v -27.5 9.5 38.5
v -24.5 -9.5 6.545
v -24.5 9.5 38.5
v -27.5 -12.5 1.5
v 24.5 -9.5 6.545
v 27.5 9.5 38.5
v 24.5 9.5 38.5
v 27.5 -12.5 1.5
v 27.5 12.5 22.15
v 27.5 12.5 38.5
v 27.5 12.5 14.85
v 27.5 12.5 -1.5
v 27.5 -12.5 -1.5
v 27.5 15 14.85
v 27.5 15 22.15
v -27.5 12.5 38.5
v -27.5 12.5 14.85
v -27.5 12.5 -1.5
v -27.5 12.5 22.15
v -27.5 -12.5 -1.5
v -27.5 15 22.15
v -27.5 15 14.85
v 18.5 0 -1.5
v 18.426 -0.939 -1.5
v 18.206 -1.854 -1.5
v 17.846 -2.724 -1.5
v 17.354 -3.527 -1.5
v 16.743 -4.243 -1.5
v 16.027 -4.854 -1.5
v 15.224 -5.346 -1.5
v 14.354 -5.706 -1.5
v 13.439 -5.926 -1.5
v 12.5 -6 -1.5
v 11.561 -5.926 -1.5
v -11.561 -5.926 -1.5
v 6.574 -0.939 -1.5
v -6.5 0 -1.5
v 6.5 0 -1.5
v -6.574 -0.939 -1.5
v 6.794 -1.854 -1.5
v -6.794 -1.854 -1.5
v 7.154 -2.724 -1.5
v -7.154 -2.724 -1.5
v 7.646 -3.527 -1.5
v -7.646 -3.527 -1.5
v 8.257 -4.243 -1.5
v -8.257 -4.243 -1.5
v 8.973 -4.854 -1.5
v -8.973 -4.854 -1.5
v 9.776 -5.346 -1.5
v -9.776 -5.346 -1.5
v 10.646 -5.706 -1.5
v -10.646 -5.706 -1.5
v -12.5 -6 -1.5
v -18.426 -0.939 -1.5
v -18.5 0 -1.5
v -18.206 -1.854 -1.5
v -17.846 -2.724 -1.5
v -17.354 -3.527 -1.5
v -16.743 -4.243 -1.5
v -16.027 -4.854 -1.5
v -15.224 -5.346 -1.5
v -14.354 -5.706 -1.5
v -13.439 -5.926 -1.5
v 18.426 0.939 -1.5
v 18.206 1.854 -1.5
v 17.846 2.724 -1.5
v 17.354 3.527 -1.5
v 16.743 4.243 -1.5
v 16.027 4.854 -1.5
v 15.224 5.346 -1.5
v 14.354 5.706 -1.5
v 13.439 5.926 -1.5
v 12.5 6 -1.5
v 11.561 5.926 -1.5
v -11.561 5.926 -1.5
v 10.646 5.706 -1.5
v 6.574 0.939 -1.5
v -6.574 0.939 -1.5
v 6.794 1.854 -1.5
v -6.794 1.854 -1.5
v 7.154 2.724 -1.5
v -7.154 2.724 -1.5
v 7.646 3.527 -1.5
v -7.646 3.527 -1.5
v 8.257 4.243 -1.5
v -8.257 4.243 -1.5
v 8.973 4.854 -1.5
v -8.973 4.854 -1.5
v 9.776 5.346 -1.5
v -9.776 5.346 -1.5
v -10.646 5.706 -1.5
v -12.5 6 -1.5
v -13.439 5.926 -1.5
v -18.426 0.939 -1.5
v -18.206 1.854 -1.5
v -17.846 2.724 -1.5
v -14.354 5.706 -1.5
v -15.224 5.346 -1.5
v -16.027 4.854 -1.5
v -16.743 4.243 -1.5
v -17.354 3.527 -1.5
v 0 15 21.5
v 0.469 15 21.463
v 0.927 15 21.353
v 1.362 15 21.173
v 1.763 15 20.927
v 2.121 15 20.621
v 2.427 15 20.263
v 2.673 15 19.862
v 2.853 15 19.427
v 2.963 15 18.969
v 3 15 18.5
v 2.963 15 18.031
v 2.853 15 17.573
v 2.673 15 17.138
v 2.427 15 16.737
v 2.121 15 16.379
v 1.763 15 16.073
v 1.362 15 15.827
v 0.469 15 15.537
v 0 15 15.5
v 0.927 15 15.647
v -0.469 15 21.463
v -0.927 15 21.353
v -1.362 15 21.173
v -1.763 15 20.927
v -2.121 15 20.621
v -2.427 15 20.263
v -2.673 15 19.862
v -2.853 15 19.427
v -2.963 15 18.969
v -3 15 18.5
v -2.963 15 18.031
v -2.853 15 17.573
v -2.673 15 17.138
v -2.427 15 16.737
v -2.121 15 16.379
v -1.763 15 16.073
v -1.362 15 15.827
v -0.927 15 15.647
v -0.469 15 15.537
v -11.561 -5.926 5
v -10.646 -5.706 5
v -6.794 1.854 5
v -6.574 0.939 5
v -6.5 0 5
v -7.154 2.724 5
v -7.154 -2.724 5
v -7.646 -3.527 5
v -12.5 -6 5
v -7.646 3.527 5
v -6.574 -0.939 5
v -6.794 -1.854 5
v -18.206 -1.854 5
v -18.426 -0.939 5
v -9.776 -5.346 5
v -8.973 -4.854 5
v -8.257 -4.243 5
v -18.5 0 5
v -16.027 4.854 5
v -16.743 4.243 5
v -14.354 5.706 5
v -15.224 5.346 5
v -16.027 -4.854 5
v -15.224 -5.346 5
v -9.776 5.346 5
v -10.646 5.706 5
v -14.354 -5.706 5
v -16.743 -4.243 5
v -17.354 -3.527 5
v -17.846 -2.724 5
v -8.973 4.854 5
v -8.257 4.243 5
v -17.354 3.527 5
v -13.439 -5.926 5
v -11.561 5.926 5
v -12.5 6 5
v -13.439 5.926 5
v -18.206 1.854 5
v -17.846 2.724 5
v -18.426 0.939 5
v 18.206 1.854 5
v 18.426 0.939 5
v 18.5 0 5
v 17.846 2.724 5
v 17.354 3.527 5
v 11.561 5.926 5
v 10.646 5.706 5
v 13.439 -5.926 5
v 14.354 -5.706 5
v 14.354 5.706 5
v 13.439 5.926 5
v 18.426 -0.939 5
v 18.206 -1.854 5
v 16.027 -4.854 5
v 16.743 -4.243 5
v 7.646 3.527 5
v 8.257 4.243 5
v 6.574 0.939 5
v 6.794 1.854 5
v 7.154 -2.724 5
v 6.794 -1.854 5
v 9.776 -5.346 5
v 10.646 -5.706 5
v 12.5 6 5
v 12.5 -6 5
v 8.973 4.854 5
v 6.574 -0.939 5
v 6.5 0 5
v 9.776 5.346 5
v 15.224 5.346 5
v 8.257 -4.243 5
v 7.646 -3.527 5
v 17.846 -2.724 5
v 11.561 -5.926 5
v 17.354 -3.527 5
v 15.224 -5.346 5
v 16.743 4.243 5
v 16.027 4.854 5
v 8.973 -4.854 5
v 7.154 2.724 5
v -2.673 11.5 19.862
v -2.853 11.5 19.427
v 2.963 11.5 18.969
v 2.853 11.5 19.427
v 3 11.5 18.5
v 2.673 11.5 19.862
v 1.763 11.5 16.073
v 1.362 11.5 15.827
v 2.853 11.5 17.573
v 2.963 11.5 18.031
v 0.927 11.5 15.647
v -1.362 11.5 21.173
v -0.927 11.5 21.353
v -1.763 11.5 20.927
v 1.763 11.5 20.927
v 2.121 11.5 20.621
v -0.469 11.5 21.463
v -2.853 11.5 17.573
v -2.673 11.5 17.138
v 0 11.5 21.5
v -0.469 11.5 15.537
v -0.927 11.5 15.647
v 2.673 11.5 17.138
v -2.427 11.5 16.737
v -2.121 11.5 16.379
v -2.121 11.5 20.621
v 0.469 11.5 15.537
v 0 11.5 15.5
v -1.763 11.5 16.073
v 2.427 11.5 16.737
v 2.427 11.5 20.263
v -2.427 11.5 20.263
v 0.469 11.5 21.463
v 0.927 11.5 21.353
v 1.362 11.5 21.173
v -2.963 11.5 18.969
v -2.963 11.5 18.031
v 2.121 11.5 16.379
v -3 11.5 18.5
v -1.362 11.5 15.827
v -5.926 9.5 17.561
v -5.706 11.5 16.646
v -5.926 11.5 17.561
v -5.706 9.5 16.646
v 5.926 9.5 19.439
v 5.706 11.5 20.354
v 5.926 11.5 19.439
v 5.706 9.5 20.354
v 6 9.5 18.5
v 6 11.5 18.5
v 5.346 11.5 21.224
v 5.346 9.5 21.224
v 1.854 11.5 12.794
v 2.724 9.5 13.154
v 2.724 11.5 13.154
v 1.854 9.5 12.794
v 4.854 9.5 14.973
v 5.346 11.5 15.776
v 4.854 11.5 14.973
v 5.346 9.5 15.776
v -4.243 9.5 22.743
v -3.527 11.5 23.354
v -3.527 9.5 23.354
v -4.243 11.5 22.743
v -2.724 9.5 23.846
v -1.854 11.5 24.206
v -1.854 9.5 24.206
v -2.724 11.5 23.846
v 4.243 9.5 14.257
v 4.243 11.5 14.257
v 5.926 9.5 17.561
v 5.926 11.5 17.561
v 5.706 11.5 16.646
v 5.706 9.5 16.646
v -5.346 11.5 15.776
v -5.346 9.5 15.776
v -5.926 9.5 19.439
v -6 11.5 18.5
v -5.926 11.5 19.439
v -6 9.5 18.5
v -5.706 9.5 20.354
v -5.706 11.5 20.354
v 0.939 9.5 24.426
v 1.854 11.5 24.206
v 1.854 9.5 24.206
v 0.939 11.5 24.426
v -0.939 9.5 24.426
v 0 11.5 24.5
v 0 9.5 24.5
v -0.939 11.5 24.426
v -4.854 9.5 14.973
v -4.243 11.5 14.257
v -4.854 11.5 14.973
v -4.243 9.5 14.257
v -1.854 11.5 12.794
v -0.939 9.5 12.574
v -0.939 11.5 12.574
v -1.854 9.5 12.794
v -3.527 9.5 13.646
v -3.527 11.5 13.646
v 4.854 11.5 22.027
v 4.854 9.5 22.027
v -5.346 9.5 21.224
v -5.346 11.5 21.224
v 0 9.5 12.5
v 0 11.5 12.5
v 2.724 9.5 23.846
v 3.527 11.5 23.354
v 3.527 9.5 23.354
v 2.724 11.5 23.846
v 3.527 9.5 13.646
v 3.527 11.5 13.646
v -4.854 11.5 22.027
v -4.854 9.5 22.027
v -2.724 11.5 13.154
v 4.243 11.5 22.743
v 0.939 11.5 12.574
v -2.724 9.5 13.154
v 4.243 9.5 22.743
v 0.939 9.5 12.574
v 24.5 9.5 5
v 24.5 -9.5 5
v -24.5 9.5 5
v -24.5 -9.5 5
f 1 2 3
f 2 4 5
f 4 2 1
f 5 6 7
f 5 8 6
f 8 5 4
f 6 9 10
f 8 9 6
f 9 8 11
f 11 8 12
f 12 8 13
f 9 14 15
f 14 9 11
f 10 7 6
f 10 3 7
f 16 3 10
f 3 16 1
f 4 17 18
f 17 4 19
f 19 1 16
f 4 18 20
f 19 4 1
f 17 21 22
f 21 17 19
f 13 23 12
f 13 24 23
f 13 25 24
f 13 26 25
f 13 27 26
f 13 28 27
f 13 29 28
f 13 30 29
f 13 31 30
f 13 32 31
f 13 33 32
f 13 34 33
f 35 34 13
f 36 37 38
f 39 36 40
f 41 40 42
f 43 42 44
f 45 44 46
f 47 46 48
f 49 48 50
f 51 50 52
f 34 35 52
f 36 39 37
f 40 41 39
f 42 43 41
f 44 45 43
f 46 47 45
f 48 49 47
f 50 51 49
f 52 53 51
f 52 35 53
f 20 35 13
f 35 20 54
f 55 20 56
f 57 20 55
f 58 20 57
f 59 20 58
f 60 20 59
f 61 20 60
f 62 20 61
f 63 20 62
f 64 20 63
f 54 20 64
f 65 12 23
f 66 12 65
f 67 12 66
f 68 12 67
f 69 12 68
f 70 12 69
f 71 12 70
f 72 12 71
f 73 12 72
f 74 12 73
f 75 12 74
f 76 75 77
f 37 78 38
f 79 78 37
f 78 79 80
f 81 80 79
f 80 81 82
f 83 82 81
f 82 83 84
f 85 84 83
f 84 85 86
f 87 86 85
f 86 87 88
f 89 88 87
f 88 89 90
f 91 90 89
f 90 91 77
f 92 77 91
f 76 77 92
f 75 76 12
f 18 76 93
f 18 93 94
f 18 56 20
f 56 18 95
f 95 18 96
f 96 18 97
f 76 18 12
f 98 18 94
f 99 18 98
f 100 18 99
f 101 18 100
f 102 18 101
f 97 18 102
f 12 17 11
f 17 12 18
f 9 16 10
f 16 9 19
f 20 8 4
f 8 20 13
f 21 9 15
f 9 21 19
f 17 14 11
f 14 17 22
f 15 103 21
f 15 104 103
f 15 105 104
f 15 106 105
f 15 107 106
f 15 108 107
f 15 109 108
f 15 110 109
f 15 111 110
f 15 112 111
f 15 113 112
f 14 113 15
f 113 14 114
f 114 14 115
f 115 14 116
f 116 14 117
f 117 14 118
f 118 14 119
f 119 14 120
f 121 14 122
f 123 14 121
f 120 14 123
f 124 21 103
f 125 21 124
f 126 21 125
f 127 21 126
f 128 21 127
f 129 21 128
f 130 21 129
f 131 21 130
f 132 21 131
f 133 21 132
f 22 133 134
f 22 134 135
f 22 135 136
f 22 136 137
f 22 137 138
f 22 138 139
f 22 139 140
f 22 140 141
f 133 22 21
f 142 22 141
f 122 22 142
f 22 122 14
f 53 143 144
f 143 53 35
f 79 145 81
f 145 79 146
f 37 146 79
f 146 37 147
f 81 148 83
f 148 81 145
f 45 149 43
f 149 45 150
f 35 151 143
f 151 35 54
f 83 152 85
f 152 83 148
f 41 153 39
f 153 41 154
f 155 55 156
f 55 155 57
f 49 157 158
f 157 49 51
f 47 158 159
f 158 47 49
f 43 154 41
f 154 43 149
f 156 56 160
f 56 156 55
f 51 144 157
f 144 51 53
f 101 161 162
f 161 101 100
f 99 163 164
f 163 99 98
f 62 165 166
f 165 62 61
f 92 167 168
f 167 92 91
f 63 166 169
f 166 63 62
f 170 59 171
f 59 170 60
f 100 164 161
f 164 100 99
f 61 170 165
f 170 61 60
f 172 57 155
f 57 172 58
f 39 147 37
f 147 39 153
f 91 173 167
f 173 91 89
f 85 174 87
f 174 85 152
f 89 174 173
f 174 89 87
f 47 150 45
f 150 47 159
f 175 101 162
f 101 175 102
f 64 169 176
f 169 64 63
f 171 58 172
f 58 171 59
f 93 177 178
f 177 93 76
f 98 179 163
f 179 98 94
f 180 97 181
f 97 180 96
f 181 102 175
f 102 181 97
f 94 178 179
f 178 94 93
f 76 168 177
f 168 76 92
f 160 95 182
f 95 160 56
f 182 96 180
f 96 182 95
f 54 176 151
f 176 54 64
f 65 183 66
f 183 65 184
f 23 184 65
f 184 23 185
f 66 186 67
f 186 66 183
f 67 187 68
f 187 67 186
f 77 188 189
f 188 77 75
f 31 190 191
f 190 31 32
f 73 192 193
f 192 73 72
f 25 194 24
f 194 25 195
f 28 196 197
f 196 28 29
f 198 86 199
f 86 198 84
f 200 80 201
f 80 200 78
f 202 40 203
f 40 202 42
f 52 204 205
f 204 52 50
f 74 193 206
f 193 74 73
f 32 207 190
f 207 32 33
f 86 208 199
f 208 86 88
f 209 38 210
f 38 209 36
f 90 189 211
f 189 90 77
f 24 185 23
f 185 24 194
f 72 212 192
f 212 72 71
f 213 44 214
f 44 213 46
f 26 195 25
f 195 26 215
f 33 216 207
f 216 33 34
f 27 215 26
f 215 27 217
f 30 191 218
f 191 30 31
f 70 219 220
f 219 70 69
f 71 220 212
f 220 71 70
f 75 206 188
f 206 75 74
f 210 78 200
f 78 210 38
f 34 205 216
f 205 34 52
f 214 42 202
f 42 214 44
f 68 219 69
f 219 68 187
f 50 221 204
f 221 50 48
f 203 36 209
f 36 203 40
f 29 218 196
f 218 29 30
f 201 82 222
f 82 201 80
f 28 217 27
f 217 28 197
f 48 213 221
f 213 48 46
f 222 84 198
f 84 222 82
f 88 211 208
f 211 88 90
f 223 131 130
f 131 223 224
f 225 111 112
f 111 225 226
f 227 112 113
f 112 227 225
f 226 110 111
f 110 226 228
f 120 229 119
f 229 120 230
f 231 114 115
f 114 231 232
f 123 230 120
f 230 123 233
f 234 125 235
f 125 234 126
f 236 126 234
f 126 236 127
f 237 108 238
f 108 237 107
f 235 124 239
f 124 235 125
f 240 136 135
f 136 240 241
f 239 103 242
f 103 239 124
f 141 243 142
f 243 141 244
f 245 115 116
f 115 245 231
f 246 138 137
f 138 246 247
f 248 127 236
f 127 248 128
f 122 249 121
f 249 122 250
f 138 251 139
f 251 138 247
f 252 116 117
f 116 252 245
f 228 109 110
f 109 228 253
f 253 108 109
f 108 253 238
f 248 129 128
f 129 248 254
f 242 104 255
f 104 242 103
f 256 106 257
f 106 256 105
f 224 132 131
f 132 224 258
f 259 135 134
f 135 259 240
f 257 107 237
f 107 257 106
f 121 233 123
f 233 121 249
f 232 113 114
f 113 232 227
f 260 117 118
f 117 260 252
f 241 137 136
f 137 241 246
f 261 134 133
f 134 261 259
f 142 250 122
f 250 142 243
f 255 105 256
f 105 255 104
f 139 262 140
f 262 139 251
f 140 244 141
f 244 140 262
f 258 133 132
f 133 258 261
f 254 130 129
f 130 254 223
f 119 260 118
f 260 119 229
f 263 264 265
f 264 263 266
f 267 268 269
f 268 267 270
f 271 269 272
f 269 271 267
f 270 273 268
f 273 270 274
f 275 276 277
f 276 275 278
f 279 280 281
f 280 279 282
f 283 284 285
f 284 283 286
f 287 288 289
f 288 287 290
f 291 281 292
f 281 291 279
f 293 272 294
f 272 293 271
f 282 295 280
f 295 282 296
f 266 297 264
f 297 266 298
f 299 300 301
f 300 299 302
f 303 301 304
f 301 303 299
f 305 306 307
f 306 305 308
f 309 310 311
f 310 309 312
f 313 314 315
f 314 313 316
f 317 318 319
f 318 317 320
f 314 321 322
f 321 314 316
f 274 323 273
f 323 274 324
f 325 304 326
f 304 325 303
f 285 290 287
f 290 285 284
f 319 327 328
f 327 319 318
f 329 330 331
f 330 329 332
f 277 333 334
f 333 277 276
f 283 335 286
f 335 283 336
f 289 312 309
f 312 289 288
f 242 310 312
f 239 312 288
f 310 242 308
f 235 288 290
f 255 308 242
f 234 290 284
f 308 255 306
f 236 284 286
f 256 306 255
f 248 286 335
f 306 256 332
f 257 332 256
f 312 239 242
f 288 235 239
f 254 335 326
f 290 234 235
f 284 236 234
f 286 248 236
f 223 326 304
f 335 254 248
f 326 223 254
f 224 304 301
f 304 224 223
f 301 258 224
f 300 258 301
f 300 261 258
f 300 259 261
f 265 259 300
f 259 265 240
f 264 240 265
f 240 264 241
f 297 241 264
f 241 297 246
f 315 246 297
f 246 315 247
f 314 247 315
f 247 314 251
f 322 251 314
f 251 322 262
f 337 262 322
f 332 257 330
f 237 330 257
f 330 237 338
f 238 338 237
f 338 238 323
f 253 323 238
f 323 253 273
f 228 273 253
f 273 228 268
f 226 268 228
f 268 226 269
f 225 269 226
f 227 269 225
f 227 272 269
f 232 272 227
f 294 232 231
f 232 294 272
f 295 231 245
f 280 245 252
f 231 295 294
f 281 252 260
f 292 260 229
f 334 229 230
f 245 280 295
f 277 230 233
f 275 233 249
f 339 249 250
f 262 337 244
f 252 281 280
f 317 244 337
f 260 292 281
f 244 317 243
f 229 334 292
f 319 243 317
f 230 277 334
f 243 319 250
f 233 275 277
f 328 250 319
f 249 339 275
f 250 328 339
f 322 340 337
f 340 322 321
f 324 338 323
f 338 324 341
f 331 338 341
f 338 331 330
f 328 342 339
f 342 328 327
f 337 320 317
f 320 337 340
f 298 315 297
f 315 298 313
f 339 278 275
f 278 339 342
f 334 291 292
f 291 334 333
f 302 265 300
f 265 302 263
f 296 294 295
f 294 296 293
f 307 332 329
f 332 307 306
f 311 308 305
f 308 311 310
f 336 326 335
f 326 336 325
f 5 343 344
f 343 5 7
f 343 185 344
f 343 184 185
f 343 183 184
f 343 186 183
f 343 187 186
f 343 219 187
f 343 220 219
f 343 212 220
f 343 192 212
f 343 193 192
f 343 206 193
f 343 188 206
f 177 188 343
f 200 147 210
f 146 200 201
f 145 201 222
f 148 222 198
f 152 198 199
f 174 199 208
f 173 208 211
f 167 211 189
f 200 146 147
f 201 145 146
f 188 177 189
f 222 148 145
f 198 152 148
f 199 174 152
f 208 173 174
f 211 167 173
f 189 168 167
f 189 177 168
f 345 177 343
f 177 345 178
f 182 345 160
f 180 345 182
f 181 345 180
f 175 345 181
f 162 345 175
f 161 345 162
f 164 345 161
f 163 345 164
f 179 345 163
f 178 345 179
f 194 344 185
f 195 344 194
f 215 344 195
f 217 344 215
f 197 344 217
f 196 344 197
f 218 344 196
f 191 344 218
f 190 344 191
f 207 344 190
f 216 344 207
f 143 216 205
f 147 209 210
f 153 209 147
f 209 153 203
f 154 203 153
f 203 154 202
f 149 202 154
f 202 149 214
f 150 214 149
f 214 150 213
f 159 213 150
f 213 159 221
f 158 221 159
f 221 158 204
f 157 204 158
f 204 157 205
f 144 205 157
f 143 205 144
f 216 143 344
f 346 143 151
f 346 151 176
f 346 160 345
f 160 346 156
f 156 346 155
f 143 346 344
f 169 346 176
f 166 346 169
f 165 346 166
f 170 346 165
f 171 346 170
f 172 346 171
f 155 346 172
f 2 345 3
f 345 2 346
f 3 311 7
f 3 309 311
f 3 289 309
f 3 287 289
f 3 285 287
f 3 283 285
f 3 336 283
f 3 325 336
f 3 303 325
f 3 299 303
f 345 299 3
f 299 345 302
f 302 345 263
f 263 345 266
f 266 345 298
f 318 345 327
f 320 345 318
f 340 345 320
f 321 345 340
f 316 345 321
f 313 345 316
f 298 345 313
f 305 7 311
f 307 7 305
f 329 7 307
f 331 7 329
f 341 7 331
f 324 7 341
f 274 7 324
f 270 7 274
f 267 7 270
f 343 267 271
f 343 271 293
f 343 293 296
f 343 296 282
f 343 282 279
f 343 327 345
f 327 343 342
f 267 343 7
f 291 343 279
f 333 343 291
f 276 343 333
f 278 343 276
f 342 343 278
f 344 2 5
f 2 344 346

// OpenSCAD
$fn = 40;

FACE_WIDTH = 55;
FACE_HEIGHT = 25;
FACE_THICKNESS = 3;

PLUG_DIAMETER = 12;

HOLDER_WIDTH = FACE_WIDTH;
HOLDER_HEIGHT = 40;
HOLDER_THICKNESS = FACE_THICKNESS;

module face(hole = false) { 
    if (hole) {
        for (pos = [
            [-12.5, 0, 0],
            [12.5, 0, 0]
        ]) {
            translate(pos) {
                cylinder(r = PLUG_DIAMETER / 2, h = 100, center = true);
            }
        }
    } else {
        cube(size = [FACE_WIDTH, FACE_HEIGHT, FACE_THICKNESS], center = true);
    }
}

module holder(hole = false) {
    translate([0, FACE_HEIGHT / 2 - FACE_THICKNESS / 2, HOLDER_HEIGHT / 2 - FACE_THICKNESS / 2]) {
        rotate([90, 0, 0]) {
            if (hole) {
                cylinder(r = 3, h = 10, center = true);
                translate([0, 0, 1]) {
                    cylinder(r = 6, h = 3, center = true);
                }
            } else {
                cube(size = [HOLDER_WIDTH, HOLDER_HEIGHT, HOLDER_THICKNESS], center = true);
            }
        }
    }
}

module main() { 
    difference() {
        union() {
            hull() {
                face();
                holder();
            }

            translate([0, FACE_HEIGHT / 2, HOLDER_HEIGHT / 2 - FACE_THICKNESS / 2]) {
                cube(size = [HOLDER_WIDTH, 5, 7.3], center = true);
            }
        }

        face(hole = true);
        holder(hole = true);
        translate([0, 0, FACE_HEIGHT]) {
            cube(size = [FACE_WIDTH - 2 * FACE_THICKNESS, FACE_HEIGHT - 2 * FACE_THICKNESS, HOLDER_HEIGHT], center = true);
        }
    }
}

main();
